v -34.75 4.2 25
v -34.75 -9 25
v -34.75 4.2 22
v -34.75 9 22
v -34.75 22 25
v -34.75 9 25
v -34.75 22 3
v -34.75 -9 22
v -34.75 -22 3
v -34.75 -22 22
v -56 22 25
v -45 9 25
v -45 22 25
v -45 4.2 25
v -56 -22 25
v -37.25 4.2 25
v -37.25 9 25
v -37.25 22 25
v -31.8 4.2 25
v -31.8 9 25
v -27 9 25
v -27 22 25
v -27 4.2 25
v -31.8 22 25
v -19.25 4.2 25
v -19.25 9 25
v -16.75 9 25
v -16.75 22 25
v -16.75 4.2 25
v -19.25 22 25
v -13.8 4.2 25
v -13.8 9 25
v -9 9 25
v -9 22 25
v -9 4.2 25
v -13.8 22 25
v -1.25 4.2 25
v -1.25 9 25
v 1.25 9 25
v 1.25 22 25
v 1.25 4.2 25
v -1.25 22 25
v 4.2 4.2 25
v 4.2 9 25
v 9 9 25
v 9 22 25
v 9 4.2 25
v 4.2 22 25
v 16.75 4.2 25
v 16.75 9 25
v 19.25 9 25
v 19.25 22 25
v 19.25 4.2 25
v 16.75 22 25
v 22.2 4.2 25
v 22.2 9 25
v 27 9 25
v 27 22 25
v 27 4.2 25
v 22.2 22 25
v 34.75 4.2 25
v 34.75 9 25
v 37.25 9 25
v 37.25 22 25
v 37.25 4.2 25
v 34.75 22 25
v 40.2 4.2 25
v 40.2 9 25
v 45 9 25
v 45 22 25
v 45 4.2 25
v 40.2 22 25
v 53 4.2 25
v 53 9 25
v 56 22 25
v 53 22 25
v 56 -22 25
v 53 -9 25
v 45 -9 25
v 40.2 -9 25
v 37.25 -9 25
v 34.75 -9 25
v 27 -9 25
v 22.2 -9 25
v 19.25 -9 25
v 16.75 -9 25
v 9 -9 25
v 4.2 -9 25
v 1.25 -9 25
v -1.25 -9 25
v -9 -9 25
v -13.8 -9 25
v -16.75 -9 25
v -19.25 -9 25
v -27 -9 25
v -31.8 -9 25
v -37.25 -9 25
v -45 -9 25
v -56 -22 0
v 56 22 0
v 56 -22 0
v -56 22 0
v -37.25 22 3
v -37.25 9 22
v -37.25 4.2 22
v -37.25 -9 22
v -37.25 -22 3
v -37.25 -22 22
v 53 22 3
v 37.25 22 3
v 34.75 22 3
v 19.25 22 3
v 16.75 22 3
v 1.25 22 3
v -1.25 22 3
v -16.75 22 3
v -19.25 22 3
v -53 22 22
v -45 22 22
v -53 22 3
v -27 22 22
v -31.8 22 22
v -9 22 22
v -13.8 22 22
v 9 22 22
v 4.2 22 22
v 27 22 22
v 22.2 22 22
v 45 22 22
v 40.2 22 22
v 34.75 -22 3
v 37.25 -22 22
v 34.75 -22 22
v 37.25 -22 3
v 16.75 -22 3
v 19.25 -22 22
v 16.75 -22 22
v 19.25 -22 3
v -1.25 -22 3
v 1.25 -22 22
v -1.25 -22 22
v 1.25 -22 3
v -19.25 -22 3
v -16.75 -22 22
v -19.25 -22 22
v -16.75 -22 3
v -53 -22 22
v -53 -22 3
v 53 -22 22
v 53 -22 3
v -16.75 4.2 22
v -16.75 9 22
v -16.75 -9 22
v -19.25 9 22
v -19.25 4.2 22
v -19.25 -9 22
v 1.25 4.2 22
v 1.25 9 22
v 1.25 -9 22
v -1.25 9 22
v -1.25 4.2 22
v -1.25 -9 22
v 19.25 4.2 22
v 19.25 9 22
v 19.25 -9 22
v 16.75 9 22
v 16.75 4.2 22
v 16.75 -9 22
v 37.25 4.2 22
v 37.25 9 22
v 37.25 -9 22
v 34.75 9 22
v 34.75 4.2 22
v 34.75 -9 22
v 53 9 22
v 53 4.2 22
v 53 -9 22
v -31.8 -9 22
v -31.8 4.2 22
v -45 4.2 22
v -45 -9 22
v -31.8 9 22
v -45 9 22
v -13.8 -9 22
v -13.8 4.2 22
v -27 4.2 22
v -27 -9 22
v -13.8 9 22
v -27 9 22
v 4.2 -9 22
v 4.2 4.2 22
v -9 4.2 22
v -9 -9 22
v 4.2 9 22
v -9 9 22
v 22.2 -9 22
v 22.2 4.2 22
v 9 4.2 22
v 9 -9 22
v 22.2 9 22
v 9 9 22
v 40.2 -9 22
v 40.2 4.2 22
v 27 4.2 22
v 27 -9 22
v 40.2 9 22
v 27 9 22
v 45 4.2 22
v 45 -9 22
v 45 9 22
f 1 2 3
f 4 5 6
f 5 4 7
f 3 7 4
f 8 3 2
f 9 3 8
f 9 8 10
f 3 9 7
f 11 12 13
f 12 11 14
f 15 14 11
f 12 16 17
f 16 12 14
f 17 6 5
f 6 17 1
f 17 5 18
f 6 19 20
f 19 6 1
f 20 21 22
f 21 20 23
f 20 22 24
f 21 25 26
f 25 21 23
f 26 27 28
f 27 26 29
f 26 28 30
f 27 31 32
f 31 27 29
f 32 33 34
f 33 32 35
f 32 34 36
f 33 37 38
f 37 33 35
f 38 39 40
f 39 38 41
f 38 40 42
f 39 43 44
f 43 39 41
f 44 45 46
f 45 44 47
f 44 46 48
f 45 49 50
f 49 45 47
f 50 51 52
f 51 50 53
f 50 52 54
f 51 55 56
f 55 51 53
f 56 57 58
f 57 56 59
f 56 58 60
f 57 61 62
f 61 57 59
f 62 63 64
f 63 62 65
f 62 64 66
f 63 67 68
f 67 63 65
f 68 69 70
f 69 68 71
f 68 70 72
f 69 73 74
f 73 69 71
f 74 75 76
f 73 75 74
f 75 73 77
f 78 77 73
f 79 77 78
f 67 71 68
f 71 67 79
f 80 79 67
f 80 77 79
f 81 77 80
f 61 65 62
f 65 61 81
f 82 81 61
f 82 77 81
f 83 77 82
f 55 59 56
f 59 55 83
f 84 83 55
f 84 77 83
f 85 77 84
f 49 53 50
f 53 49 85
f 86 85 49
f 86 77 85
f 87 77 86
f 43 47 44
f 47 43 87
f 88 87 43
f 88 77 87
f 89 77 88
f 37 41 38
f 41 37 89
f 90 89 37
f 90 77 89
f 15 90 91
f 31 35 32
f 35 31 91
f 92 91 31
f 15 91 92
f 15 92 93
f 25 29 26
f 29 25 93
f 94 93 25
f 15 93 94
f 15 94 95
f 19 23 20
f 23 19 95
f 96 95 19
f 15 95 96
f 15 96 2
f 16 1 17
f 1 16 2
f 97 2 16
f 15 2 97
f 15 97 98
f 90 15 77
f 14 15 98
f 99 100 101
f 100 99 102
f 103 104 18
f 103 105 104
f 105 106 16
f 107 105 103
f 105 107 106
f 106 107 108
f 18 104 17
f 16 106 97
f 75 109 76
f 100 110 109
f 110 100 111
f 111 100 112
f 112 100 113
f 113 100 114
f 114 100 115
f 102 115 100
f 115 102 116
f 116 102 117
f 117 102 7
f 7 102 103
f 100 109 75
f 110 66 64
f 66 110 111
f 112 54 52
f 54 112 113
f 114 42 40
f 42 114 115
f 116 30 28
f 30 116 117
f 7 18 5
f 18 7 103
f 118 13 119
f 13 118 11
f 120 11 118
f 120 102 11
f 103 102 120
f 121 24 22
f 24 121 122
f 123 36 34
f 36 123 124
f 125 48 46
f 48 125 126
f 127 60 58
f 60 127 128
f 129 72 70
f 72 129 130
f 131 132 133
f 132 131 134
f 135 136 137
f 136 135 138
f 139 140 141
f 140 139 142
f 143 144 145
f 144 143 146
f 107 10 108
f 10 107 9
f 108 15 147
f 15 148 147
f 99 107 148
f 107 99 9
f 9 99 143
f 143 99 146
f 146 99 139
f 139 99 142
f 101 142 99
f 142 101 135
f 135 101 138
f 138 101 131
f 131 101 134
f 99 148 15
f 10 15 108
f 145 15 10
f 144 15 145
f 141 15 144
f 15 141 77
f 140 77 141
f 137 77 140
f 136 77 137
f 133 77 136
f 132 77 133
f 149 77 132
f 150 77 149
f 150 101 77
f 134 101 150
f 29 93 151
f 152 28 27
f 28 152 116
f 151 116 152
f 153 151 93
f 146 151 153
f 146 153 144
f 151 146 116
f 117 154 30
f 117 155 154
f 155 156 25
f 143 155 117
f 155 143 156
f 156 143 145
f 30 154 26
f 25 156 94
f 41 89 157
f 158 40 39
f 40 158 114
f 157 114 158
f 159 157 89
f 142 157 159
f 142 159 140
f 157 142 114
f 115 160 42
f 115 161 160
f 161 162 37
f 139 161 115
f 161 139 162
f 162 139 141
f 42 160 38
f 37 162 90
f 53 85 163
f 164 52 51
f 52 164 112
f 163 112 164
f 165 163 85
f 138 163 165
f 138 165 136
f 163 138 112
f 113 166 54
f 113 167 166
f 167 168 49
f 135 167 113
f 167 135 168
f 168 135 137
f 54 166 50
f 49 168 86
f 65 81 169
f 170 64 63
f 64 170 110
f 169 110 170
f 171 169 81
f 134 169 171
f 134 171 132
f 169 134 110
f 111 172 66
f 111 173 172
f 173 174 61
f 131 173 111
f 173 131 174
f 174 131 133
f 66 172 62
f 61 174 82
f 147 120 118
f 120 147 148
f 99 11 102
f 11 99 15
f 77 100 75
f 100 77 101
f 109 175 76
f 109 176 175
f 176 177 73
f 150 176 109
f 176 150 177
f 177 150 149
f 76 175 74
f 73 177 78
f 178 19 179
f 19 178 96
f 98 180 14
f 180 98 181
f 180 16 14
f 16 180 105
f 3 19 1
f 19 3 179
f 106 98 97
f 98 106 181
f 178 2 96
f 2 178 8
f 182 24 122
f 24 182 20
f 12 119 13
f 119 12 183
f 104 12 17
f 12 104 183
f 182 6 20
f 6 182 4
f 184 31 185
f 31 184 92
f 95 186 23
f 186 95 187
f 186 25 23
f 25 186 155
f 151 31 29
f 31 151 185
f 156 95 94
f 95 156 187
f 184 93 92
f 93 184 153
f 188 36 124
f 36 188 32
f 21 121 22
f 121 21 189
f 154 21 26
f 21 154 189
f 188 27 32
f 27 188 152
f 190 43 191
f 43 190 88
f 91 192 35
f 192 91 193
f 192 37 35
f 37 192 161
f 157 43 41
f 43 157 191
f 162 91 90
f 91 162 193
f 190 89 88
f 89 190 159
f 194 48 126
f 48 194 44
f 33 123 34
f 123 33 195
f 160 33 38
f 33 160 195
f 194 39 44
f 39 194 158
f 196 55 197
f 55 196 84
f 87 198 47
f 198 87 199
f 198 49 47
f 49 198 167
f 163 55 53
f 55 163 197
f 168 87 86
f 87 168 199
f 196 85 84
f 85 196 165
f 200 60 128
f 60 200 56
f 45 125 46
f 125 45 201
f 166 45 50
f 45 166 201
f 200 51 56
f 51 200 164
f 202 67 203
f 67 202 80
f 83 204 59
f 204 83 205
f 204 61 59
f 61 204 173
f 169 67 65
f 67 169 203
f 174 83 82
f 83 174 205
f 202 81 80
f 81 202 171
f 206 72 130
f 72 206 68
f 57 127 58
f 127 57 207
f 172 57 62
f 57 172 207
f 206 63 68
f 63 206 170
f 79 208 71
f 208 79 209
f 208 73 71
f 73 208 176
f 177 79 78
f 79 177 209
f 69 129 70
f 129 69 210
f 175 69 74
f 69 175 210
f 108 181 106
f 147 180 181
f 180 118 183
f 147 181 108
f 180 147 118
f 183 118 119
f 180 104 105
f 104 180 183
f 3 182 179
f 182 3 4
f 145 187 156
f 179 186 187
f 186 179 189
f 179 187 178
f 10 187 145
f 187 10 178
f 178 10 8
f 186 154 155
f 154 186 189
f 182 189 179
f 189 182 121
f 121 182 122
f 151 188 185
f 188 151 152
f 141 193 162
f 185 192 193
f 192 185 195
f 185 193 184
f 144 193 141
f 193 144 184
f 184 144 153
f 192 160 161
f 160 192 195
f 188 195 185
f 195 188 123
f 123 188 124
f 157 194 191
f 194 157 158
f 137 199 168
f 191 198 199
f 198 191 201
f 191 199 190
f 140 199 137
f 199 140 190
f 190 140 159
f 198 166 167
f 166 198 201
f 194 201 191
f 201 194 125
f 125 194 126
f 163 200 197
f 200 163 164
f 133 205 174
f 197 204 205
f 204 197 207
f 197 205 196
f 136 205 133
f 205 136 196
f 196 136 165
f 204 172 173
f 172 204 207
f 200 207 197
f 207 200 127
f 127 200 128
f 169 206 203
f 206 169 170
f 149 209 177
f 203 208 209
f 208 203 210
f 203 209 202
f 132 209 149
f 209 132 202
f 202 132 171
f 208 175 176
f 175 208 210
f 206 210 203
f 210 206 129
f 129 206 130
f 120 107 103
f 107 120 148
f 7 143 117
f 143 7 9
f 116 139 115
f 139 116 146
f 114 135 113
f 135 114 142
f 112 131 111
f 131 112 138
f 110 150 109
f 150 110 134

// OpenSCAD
// --- Dimensions ---
base_width_x = 112;          // Total width of the base plate (X)
base_depth_y = 44;           // Total depth of the base plate (Y)
base_thickness = 3;          // Thickness of the base plate (Z)

deck_width_x = 112;           // Total width of the deck plate (X)
deck_depth_y = 44;           // Total depth of the deck plate (Y)
deck_thickness = 3;          // Thickness of the deck plate (Z)
deck_z_bottom = 22;          // Z-coordinate of the bottom of the deck
deck_z_top = 25;             // Z-coordinate of the top of the deck

end_wall_thickness = 3;      // Thickness of the two end walls
rib_thickness = 2.5;         // Thickness of the five internal ribs
wall_height = 25;            // Total height of the walls (Z)

hole_size = 13;              // Dimension of the square cuvette holes
hole_spacing_x = 18;         // Center-to-center spacing along X
hole_spacing_y = 18;         // Center-to-center spacing along Y
rows = 2;                    // Number of rows along Y
cols = 6;                    // Number of columns along X

// --- Constants ---
$fn = 64;

// --- Helper Functions ---
function get_hole_x(col_idx) = (col_idx - (cols - 1) / 2) * hole_spacing_x;
function get_hole_y(row_idx) = (row_idx - (rows - 1) / 2) * hole_spacing_y;

// --- Main Construction ---

// We use a union of the base, the walls, and the deck.
// The holes are subtracted only from the deck plate using a difference.
union() {
    // 1. The Base Plate (Z = 0 to 3)
    translate([-base_width_x/2, -base_depth_y/2, 0])
        cube([base_width_x, base_depth_y, base_thickness]);

    // 2. The Vertical Walls and Ribs (Z = 0 to 25)
    // We use a union to combine the end walls and the internal ribs.
    union() {
        // Two end walls (flush with short ends)
        translate([-base_width_x/2, -base_depth_y/2, 0])
            cube([end_wall_thickness, base_depth_y, wall_height]);
        
        translate([base_width_x/2 - end_wall_thickness, -base_depth_y/2, 0])
            cube([end_wall_thickness, base_depth_y, wall_height]);

        // Five internal ribs at specified X positions
        for (rx = [-36, -18, 0, 18, 36]) {
            translate([rx - rib_thickness/2, -base_depth_y/2, 0])
                cube([rib_thickness, base_depth_y, wall_height]);
        }
    }

    // 3. The Deck Plate (Z = 22 to 25)
    // We use a difference to subtract the holes specifically from the deck plate.
    difference() {
        // The solid deck plate
        translate([-deck_width_x/2, -deck_depth_y/2, deck_z_bottom])
            cube([deck_width_x, deck_depth_y, deck_thickness]);

        // The 12 Square Through-Holes
        // We subtract these from the deck plate.
        for (i = [0 : cols - 1]) {
            for (j = [0 : rows - 1]) {
                // Subtracting from the deck plate only. 
                // The cube extends slightly beyond the deck to ensure a clean cut.
                translate([get_hole_x(i), get_hole_y(j), deck_z_bottom - 0.1])
                    cube([hole_size + 0.2, hole_size + 0.2, deck_thickness + 0.2]);
            }
        }
    }
}
